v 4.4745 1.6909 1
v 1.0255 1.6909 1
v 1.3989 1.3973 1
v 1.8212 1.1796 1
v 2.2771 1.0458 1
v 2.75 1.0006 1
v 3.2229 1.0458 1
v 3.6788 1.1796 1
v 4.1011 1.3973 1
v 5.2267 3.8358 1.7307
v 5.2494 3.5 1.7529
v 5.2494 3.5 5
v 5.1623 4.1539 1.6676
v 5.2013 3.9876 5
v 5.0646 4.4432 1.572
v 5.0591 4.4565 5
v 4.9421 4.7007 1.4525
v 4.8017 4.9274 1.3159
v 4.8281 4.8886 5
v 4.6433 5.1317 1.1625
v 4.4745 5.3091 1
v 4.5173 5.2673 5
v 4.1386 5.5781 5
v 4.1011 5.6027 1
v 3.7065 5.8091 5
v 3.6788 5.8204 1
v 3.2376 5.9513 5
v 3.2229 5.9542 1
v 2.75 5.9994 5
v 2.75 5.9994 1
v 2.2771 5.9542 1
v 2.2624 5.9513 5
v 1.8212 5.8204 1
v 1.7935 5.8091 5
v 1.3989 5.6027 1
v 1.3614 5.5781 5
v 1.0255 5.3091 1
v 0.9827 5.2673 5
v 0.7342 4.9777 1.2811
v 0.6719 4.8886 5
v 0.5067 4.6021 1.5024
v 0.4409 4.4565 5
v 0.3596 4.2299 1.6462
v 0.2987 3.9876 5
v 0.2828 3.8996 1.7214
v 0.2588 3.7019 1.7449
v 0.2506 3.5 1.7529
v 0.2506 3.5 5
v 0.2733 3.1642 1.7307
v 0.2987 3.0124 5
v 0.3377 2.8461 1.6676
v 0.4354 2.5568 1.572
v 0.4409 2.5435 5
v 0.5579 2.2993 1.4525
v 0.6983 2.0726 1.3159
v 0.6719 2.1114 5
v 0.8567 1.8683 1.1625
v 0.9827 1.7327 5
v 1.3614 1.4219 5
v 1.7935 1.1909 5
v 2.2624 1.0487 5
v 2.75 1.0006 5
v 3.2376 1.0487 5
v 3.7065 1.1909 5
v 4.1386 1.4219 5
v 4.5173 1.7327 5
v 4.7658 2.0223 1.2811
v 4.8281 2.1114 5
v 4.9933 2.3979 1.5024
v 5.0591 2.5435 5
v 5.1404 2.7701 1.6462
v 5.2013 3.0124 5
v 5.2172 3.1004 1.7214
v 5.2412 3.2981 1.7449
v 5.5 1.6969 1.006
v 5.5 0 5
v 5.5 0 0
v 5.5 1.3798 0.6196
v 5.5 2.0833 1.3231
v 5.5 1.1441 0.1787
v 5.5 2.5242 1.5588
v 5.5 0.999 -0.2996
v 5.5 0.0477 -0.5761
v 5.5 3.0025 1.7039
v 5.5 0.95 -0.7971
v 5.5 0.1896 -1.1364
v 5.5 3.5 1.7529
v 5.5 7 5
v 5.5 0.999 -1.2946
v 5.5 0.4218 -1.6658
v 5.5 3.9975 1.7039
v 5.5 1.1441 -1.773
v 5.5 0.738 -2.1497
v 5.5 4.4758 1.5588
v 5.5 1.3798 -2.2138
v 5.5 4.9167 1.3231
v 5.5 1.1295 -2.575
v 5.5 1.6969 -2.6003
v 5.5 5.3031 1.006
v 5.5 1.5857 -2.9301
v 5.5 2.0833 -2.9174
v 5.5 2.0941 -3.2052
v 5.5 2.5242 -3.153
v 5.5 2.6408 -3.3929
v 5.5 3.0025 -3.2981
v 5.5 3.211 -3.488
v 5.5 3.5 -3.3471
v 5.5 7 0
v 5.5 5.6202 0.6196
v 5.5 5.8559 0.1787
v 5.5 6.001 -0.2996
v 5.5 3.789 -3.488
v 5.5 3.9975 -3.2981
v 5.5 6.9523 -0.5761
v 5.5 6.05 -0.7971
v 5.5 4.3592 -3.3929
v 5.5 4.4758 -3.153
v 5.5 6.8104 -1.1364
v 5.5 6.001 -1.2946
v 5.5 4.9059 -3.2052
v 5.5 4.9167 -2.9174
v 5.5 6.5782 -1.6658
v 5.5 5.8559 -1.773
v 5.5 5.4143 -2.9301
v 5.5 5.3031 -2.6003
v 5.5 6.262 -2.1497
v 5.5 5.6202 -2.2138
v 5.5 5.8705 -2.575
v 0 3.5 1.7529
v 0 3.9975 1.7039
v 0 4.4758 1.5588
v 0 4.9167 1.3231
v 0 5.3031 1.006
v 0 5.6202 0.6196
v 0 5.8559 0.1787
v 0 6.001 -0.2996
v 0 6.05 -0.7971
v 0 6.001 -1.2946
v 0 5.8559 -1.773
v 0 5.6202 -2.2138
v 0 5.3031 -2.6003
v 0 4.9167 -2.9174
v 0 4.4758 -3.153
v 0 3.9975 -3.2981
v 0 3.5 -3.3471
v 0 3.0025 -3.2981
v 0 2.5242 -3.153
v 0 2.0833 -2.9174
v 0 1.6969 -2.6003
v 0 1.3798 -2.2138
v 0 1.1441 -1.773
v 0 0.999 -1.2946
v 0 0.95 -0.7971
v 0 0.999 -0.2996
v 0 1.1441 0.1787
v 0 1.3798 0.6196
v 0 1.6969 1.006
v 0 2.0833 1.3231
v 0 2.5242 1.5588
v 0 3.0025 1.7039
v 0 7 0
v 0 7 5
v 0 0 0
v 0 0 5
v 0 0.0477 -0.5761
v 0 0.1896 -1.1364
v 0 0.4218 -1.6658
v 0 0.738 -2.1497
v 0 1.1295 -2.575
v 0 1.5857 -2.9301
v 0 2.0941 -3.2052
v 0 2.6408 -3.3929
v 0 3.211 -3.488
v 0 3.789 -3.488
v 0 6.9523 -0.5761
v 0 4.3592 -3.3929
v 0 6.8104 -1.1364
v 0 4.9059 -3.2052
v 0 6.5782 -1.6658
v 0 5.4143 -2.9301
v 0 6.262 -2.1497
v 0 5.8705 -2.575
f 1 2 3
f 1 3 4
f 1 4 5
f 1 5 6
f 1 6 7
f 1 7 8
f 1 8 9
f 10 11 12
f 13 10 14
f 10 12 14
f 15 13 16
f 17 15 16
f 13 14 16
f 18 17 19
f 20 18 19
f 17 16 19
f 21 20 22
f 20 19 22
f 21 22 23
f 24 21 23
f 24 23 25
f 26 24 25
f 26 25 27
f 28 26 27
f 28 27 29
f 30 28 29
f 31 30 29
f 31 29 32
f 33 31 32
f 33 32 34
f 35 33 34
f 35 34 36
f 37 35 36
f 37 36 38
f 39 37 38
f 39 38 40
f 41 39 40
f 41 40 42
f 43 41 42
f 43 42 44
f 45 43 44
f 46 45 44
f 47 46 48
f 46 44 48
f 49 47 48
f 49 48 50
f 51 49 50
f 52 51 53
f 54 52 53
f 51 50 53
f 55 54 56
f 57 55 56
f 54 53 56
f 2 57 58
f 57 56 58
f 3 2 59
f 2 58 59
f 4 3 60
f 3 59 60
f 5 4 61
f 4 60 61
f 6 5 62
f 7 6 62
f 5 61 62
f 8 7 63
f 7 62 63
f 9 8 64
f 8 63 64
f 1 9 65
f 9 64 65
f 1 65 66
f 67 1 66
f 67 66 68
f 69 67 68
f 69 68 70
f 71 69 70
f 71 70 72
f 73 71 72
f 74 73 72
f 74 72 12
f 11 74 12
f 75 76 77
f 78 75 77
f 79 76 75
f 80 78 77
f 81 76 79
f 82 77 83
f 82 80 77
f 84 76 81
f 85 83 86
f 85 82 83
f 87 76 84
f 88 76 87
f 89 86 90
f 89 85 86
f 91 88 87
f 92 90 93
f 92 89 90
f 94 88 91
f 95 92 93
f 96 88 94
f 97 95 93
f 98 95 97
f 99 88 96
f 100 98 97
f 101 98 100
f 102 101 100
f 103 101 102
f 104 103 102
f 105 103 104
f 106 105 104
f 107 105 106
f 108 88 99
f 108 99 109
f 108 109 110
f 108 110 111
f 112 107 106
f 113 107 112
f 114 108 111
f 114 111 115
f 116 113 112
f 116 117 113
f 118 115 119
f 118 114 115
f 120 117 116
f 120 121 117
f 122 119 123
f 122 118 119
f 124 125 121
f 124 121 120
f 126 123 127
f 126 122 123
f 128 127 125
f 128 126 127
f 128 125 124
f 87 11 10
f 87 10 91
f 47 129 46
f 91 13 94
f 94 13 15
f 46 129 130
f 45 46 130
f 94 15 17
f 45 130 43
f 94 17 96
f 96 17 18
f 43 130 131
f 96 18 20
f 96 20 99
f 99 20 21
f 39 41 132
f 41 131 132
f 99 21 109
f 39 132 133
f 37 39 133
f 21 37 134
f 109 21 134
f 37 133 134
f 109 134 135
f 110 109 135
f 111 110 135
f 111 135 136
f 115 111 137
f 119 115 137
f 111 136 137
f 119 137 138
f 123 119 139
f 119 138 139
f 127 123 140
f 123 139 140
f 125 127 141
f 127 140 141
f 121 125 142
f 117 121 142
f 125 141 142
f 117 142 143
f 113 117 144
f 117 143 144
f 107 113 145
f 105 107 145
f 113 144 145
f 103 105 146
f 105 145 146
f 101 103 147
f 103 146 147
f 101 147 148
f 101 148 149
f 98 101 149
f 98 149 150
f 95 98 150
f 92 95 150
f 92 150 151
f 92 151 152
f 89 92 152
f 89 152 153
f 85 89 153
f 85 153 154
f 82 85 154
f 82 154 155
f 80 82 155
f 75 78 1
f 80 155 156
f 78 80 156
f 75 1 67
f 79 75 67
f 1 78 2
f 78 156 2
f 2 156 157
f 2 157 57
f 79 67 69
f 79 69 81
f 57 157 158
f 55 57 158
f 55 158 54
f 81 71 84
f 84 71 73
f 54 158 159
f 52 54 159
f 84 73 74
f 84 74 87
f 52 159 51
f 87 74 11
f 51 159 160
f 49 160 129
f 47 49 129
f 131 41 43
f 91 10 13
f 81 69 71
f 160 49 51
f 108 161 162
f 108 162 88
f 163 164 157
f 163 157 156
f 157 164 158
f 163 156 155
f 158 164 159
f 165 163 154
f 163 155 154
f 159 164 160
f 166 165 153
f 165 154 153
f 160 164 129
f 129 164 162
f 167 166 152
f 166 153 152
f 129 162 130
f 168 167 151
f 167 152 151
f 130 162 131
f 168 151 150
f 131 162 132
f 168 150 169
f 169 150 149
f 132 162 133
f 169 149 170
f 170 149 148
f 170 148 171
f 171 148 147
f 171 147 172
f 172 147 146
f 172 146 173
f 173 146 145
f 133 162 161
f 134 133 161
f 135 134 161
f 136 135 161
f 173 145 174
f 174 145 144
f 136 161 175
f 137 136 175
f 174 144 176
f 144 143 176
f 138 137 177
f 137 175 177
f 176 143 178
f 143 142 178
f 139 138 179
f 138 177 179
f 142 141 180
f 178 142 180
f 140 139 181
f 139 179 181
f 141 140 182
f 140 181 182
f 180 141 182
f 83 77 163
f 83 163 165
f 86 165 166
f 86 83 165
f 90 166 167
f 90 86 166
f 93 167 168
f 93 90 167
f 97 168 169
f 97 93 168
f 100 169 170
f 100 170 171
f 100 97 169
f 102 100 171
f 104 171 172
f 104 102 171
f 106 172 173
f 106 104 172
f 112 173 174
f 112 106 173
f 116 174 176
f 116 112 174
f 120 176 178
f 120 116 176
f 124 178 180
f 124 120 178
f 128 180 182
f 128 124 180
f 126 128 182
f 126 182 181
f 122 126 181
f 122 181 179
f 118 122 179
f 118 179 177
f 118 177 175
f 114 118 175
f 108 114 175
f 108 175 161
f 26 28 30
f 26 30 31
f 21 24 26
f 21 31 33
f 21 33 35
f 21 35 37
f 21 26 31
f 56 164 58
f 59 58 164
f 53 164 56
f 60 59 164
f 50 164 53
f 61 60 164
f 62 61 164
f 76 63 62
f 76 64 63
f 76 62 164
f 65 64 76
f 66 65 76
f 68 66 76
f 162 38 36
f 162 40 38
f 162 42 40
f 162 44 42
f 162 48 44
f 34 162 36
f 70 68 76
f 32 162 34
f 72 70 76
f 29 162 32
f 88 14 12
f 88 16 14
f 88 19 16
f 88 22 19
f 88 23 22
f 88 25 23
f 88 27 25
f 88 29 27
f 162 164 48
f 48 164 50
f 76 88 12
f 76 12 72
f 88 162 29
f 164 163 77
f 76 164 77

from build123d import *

# Parameters (mm, degrees)
SKETCH1_W           = 5.5
SKETCH1_H           = 7
BOSS_EXTRUDE1_DEPTH = 5
BOSS_EXTRUDE2_DEPTH = 5.5
SKETCH4_R           = 2.55
CUT_EXTRUDE1_DEPTH  = 11.210288928
SKETCH5_R           = 2.499369643
CUT_EXTRUDE2_DEPTH  = 4


with BuildPart() as part:
    # Sketch1 → Boss-Extrude1 (new body)
    with BuildSketch(Plane.XY):
        with Locations((2.75, 3.5)):
            Rectangle(SKETCH1_W, SKETCH1_H)
    extrude(amount=BOSS_EXTRUDE1_DEPTH)

    # Sketch3 → Boss-Extrude2 (add)
    with BuildSketch(Plane(origin=(5.5, 0, 0), x_dir=(0, 0, -1), z_dir=(1, 0, 0))):
        with BuildLine():
            Line((0, 7), (0, 0))
            ThreePointArc((0, 0), (3.5, 3.5), (0, 7))
        make_face()
    extrude(amount=-BOSS_EXTRUDE2_DEPTH)

    # Sketch4 → Cut-Extrude1 (cut, through all)
    with BuildSketch(Plane.ZY):
        with Locations((-0.797128345, 3.5)):
            Circle(SKETCH4_R)
    extrude(amount=-CUT_EXTRUDE1_DEPTH, mode=Mode.SUBTRACT)

    # Sketch5 → Cut-Extrude2 (cut)
    with BuildSketch(Plane.XY.offset(5)):
        with Locations((2.75, 3.5)):
            Circle(SKETCH5_R)
    extrude(amount=-CUT_EXTRUDE2_DEPTH, mode=Mode.SUBTRACT)


solid = part.part
